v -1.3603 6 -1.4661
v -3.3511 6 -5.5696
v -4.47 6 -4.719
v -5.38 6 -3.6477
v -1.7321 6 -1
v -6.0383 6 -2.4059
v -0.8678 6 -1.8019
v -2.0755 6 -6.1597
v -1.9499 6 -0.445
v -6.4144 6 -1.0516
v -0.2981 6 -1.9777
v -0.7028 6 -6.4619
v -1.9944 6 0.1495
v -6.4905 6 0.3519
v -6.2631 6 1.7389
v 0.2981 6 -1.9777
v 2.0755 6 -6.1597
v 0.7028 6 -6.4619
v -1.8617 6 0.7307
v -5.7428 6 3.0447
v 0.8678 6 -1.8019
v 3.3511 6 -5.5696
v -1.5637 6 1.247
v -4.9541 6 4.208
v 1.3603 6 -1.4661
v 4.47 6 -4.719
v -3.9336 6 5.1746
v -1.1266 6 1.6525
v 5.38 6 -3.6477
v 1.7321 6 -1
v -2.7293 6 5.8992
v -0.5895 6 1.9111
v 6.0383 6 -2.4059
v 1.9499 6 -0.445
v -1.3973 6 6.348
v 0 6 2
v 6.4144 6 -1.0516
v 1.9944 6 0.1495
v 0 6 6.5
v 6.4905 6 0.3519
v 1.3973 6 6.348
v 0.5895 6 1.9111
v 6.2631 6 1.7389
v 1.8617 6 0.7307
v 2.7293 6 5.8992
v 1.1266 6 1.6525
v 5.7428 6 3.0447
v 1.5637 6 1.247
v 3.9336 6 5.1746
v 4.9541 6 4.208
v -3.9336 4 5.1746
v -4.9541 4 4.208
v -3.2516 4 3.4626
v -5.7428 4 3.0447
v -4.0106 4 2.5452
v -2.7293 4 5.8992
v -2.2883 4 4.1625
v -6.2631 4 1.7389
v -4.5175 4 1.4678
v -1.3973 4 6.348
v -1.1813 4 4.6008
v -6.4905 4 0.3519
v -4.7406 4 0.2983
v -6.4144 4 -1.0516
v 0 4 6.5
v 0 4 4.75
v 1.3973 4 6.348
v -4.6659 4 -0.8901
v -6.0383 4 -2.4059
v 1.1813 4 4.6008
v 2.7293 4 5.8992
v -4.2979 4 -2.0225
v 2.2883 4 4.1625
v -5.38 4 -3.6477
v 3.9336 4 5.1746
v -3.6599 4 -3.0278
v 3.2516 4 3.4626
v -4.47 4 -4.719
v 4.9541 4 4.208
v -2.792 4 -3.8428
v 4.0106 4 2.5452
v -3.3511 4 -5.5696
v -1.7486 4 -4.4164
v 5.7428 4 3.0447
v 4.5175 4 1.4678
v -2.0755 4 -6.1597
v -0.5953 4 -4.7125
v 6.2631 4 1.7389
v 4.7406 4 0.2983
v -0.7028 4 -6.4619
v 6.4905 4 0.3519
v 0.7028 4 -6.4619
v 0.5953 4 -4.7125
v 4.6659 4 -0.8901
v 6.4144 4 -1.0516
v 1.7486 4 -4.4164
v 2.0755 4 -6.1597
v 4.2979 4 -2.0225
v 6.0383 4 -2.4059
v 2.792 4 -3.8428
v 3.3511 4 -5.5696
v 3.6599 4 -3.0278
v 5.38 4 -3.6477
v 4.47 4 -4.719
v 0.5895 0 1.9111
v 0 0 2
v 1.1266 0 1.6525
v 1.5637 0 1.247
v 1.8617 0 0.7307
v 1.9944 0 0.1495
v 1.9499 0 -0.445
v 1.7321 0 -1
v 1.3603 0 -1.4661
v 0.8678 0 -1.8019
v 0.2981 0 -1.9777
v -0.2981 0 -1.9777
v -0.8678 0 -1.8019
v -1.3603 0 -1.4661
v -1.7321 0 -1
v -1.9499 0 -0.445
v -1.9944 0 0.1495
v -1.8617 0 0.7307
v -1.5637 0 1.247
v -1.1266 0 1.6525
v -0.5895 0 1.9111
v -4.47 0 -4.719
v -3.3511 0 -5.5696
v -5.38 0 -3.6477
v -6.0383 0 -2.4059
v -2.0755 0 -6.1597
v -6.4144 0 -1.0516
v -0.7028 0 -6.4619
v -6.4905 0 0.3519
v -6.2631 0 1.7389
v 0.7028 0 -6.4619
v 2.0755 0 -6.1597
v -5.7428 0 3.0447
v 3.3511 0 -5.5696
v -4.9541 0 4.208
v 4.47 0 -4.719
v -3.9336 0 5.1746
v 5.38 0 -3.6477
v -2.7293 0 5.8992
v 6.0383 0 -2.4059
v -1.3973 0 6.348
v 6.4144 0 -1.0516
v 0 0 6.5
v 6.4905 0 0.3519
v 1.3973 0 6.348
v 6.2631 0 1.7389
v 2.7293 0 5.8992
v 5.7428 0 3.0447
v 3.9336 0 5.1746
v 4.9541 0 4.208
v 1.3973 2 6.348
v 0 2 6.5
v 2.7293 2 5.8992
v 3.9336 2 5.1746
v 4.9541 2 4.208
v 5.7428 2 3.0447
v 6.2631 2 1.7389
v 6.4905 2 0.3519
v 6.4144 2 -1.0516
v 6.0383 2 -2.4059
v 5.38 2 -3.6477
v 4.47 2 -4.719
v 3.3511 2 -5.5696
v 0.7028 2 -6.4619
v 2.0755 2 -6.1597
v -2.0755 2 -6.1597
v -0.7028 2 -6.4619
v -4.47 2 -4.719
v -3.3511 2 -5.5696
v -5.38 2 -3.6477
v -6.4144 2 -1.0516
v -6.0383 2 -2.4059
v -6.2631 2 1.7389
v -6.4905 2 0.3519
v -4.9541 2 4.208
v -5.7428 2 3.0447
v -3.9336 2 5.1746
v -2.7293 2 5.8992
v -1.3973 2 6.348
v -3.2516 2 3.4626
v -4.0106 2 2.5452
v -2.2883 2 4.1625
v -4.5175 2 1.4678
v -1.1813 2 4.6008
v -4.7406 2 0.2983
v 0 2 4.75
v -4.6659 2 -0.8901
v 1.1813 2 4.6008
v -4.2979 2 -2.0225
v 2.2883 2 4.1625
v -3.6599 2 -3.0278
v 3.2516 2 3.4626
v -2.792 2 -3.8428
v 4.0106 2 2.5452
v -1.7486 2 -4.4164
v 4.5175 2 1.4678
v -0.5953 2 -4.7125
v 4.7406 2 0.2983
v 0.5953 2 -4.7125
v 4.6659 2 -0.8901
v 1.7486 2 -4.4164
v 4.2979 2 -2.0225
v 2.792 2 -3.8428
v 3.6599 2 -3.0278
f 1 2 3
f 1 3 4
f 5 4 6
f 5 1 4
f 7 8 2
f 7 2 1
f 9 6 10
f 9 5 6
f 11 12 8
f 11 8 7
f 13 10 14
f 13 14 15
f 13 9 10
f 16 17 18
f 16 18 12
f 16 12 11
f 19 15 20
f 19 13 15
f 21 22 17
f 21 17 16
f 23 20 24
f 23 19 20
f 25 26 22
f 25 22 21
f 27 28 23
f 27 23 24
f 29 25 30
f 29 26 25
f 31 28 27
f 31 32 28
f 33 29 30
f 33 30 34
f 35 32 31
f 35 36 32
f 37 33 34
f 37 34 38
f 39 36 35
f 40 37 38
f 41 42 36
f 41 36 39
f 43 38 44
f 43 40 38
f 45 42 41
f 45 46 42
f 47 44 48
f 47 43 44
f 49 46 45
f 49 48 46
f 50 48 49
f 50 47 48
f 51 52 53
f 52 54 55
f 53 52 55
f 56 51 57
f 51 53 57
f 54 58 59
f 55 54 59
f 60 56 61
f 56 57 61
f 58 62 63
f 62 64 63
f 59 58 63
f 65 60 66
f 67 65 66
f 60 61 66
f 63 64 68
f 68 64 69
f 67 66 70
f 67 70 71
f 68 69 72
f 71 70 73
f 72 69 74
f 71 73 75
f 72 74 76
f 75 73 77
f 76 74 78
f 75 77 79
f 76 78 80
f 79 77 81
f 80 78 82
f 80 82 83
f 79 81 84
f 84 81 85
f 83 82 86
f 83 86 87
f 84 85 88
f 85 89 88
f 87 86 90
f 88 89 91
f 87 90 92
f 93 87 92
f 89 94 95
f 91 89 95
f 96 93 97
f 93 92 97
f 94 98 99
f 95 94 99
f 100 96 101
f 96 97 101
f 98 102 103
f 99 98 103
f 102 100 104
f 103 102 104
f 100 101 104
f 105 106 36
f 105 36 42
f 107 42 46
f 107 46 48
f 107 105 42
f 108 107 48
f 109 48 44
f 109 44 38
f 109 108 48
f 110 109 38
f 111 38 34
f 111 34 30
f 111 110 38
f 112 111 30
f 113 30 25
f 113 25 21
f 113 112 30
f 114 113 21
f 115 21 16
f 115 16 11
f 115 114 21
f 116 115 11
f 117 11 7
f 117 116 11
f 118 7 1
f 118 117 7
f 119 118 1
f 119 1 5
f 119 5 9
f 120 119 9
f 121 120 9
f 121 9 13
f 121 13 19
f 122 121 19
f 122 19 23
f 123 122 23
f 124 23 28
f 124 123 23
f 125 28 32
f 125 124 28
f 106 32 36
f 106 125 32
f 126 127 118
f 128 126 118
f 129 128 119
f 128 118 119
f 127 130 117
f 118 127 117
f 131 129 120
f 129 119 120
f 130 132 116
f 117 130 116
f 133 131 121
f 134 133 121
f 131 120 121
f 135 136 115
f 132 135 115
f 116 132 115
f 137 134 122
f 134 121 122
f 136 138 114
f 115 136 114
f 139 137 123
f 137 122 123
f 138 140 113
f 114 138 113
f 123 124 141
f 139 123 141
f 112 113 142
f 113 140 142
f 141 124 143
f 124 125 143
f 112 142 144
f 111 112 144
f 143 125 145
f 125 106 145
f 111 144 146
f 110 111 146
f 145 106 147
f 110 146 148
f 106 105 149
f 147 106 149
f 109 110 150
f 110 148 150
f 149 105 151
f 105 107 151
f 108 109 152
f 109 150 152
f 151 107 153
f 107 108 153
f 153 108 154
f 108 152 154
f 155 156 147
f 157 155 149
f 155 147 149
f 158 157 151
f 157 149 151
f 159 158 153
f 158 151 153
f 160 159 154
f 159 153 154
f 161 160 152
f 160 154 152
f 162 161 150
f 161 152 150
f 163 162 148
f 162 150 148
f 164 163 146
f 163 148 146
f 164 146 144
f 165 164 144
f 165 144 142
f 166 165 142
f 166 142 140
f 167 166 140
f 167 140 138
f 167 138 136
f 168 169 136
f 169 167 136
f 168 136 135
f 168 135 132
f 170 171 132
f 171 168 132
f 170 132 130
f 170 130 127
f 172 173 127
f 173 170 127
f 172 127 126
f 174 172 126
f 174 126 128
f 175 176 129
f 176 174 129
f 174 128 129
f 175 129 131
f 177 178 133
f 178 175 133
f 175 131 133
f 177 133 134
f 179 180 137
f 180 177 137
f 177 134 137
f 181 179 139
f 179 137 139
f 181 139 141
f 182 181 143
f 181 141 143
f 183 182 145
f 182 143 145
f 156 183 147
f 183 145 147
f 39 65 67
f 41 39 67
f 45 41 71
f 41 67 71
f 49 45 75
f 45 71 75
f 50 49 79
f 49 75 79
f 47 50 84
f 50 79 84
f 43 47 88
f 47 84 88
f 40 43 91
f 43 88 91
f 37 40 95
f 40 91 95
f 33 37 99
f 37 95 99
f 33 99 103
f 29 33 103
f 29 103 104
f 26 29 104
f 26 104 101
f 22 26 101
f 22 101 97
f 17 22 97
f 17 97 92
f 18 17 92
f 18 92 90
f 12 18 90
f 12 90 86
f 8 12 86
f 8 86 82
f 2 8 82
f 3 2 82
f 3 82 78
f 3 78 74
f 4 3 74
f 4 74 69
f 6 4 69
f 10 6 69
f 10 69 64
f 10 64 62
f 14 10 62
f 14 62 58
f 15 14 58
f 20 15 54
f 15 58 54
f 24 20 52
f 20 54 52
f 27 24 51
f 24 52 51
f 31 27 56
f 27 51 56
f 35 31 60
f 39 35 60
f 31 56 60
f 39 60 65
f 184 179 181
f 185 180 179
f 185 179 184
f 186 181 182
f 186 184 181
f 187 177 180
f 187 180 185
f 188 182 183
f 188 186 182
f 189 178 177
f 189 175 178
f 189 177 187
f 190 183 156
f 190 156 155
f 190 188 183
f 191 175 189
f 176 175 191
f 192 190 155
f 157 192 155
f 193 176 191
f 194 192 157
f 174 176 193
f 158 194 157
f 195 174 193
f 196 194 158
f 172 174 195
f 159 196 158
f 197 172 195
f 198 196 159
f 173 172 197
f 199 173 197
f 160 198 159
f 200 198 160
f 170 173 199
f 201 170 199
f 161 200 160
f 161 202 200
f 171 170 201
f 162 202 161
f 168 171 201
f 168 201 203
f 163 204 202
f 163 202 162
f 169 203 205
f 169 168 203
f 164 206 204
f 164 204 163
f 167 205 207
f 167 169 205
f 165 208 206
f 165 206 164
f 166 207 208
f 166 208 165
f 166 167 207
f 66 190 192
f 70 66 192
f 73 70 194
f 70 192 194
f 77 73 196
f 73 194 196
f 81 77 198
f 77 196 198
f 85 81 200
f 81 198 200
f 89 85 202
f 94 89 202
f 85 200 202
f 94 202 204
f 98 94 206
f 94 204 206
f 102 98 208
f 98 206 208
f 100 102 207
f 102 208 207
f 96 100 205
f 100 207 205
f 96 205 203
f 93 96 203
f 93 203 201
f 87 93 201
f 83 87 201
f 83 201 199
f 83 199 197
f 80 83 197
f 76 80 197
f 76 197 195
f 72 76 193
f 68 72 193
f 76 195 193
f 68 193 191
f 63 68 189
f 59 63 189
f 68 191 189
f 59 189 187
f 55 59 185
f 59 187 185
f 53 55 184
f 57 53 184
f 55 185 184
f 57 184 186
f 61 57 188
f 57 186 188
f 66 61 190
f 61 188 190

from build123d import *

# Parameters (mm, degrees)
SKETCH_1_R               = 6.5
SKETCH_1_R_2             = 2
EXTRUDE_1_DEPTH          = 6
CUT_EXTRUDE_1_DEPTH      = 1
CUT_EXTRUDE_1_DEPTH_BACK = 1
SKETCH_4_R               = 7
SKETCH_4_R_2             = 4.75


with BuildPart() as part:
    # 草图1 → 凸台-拉伸1 (new body)
    with BuildSketch(Plane(origin=(0, 0, 0), x_dir=(1, 0, 0), z_dir=(0, 1, 0))):
        with Locations(Location((0, 0, 0), (0, 0, 270))):
            Circle(SKETCH_1_R)
        with Locations(Location((0, 0, 0), (0, 0, 270))):
            Circle(SKETCH_1_R_2, mode=Mode.SUBTRACT)
    extrude(amount=EXTRUDE_1_DEPTH)

    # 草图4 → 切除-拉伸1 (cut, two sides: drawn at the far end of the back side and taken through both)
    with BuildSketch(Plane(origin=(0, 3, 0), x_dir=(1, 0, 0), z_dir=(0, 1, 0)).offset(-CUT_EXTRUDE_1_DEPTH_BACK)):
        Circle(SKETCH_4_R)
        with Locations(Location((0, 0, 0), (0, 0, 270))):
            Circle(SKETCH_4_R_2, mode=Mode.SUBTRACT)
    extrude(amount=CUT_EXTRUDE_1_DEPTH + CUT_EXTRUDE_1_DEPTH_BACK, mode=Mode.SUBTRACT)


solid = part.part
